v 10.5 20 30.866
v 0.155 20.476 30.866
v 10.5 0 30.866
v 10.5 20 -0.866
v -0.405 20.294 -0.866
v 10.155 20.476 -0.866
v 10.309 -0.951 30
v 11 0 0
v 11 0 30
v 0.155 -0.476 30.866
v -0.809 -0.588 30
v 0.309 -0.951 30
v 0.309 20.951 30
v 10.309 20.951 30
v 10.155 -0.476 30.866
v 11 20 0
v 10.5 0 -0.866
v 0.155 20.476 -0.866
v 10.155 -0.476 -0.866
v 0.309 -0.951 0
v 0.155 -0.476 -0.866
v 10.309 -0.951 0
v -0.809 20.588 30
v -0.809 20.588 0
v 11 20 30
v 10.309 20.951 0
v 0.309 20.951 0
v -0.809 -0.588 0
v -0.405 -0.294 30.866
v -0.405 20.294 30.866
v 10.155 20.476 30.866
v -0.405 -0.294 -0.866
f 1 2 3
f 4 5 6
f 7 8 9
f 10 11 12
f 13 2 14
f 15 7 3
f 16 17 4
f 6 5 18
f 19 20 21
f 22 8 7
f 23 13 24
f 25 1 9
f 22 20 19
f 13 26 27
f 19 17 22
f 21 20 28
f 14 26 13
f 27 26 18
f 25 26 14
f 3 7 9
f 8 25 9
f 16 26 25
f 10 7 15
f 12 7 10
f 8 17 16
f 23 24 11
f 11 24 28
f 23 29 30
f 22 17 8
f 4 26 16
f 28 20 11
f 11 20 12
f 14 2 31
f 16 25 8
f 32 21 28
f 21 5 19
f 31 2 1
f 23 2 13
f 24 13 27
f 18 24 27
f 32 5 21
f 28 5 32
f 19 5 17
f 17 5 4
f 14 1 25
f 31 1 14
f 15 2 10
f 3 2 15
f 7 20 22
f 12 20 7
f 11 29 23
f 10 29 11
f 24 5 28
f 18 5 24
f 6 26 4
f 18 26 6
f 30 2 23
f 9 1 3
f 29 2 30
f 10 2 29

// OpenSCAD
module RoundedCube(x,y,z,r){
$fn=5;
minkowski() {
  cube([x,y,z]);
  // rounded corners
  sphere(r);
}
}

RoundedCube(10,20,30,1);
